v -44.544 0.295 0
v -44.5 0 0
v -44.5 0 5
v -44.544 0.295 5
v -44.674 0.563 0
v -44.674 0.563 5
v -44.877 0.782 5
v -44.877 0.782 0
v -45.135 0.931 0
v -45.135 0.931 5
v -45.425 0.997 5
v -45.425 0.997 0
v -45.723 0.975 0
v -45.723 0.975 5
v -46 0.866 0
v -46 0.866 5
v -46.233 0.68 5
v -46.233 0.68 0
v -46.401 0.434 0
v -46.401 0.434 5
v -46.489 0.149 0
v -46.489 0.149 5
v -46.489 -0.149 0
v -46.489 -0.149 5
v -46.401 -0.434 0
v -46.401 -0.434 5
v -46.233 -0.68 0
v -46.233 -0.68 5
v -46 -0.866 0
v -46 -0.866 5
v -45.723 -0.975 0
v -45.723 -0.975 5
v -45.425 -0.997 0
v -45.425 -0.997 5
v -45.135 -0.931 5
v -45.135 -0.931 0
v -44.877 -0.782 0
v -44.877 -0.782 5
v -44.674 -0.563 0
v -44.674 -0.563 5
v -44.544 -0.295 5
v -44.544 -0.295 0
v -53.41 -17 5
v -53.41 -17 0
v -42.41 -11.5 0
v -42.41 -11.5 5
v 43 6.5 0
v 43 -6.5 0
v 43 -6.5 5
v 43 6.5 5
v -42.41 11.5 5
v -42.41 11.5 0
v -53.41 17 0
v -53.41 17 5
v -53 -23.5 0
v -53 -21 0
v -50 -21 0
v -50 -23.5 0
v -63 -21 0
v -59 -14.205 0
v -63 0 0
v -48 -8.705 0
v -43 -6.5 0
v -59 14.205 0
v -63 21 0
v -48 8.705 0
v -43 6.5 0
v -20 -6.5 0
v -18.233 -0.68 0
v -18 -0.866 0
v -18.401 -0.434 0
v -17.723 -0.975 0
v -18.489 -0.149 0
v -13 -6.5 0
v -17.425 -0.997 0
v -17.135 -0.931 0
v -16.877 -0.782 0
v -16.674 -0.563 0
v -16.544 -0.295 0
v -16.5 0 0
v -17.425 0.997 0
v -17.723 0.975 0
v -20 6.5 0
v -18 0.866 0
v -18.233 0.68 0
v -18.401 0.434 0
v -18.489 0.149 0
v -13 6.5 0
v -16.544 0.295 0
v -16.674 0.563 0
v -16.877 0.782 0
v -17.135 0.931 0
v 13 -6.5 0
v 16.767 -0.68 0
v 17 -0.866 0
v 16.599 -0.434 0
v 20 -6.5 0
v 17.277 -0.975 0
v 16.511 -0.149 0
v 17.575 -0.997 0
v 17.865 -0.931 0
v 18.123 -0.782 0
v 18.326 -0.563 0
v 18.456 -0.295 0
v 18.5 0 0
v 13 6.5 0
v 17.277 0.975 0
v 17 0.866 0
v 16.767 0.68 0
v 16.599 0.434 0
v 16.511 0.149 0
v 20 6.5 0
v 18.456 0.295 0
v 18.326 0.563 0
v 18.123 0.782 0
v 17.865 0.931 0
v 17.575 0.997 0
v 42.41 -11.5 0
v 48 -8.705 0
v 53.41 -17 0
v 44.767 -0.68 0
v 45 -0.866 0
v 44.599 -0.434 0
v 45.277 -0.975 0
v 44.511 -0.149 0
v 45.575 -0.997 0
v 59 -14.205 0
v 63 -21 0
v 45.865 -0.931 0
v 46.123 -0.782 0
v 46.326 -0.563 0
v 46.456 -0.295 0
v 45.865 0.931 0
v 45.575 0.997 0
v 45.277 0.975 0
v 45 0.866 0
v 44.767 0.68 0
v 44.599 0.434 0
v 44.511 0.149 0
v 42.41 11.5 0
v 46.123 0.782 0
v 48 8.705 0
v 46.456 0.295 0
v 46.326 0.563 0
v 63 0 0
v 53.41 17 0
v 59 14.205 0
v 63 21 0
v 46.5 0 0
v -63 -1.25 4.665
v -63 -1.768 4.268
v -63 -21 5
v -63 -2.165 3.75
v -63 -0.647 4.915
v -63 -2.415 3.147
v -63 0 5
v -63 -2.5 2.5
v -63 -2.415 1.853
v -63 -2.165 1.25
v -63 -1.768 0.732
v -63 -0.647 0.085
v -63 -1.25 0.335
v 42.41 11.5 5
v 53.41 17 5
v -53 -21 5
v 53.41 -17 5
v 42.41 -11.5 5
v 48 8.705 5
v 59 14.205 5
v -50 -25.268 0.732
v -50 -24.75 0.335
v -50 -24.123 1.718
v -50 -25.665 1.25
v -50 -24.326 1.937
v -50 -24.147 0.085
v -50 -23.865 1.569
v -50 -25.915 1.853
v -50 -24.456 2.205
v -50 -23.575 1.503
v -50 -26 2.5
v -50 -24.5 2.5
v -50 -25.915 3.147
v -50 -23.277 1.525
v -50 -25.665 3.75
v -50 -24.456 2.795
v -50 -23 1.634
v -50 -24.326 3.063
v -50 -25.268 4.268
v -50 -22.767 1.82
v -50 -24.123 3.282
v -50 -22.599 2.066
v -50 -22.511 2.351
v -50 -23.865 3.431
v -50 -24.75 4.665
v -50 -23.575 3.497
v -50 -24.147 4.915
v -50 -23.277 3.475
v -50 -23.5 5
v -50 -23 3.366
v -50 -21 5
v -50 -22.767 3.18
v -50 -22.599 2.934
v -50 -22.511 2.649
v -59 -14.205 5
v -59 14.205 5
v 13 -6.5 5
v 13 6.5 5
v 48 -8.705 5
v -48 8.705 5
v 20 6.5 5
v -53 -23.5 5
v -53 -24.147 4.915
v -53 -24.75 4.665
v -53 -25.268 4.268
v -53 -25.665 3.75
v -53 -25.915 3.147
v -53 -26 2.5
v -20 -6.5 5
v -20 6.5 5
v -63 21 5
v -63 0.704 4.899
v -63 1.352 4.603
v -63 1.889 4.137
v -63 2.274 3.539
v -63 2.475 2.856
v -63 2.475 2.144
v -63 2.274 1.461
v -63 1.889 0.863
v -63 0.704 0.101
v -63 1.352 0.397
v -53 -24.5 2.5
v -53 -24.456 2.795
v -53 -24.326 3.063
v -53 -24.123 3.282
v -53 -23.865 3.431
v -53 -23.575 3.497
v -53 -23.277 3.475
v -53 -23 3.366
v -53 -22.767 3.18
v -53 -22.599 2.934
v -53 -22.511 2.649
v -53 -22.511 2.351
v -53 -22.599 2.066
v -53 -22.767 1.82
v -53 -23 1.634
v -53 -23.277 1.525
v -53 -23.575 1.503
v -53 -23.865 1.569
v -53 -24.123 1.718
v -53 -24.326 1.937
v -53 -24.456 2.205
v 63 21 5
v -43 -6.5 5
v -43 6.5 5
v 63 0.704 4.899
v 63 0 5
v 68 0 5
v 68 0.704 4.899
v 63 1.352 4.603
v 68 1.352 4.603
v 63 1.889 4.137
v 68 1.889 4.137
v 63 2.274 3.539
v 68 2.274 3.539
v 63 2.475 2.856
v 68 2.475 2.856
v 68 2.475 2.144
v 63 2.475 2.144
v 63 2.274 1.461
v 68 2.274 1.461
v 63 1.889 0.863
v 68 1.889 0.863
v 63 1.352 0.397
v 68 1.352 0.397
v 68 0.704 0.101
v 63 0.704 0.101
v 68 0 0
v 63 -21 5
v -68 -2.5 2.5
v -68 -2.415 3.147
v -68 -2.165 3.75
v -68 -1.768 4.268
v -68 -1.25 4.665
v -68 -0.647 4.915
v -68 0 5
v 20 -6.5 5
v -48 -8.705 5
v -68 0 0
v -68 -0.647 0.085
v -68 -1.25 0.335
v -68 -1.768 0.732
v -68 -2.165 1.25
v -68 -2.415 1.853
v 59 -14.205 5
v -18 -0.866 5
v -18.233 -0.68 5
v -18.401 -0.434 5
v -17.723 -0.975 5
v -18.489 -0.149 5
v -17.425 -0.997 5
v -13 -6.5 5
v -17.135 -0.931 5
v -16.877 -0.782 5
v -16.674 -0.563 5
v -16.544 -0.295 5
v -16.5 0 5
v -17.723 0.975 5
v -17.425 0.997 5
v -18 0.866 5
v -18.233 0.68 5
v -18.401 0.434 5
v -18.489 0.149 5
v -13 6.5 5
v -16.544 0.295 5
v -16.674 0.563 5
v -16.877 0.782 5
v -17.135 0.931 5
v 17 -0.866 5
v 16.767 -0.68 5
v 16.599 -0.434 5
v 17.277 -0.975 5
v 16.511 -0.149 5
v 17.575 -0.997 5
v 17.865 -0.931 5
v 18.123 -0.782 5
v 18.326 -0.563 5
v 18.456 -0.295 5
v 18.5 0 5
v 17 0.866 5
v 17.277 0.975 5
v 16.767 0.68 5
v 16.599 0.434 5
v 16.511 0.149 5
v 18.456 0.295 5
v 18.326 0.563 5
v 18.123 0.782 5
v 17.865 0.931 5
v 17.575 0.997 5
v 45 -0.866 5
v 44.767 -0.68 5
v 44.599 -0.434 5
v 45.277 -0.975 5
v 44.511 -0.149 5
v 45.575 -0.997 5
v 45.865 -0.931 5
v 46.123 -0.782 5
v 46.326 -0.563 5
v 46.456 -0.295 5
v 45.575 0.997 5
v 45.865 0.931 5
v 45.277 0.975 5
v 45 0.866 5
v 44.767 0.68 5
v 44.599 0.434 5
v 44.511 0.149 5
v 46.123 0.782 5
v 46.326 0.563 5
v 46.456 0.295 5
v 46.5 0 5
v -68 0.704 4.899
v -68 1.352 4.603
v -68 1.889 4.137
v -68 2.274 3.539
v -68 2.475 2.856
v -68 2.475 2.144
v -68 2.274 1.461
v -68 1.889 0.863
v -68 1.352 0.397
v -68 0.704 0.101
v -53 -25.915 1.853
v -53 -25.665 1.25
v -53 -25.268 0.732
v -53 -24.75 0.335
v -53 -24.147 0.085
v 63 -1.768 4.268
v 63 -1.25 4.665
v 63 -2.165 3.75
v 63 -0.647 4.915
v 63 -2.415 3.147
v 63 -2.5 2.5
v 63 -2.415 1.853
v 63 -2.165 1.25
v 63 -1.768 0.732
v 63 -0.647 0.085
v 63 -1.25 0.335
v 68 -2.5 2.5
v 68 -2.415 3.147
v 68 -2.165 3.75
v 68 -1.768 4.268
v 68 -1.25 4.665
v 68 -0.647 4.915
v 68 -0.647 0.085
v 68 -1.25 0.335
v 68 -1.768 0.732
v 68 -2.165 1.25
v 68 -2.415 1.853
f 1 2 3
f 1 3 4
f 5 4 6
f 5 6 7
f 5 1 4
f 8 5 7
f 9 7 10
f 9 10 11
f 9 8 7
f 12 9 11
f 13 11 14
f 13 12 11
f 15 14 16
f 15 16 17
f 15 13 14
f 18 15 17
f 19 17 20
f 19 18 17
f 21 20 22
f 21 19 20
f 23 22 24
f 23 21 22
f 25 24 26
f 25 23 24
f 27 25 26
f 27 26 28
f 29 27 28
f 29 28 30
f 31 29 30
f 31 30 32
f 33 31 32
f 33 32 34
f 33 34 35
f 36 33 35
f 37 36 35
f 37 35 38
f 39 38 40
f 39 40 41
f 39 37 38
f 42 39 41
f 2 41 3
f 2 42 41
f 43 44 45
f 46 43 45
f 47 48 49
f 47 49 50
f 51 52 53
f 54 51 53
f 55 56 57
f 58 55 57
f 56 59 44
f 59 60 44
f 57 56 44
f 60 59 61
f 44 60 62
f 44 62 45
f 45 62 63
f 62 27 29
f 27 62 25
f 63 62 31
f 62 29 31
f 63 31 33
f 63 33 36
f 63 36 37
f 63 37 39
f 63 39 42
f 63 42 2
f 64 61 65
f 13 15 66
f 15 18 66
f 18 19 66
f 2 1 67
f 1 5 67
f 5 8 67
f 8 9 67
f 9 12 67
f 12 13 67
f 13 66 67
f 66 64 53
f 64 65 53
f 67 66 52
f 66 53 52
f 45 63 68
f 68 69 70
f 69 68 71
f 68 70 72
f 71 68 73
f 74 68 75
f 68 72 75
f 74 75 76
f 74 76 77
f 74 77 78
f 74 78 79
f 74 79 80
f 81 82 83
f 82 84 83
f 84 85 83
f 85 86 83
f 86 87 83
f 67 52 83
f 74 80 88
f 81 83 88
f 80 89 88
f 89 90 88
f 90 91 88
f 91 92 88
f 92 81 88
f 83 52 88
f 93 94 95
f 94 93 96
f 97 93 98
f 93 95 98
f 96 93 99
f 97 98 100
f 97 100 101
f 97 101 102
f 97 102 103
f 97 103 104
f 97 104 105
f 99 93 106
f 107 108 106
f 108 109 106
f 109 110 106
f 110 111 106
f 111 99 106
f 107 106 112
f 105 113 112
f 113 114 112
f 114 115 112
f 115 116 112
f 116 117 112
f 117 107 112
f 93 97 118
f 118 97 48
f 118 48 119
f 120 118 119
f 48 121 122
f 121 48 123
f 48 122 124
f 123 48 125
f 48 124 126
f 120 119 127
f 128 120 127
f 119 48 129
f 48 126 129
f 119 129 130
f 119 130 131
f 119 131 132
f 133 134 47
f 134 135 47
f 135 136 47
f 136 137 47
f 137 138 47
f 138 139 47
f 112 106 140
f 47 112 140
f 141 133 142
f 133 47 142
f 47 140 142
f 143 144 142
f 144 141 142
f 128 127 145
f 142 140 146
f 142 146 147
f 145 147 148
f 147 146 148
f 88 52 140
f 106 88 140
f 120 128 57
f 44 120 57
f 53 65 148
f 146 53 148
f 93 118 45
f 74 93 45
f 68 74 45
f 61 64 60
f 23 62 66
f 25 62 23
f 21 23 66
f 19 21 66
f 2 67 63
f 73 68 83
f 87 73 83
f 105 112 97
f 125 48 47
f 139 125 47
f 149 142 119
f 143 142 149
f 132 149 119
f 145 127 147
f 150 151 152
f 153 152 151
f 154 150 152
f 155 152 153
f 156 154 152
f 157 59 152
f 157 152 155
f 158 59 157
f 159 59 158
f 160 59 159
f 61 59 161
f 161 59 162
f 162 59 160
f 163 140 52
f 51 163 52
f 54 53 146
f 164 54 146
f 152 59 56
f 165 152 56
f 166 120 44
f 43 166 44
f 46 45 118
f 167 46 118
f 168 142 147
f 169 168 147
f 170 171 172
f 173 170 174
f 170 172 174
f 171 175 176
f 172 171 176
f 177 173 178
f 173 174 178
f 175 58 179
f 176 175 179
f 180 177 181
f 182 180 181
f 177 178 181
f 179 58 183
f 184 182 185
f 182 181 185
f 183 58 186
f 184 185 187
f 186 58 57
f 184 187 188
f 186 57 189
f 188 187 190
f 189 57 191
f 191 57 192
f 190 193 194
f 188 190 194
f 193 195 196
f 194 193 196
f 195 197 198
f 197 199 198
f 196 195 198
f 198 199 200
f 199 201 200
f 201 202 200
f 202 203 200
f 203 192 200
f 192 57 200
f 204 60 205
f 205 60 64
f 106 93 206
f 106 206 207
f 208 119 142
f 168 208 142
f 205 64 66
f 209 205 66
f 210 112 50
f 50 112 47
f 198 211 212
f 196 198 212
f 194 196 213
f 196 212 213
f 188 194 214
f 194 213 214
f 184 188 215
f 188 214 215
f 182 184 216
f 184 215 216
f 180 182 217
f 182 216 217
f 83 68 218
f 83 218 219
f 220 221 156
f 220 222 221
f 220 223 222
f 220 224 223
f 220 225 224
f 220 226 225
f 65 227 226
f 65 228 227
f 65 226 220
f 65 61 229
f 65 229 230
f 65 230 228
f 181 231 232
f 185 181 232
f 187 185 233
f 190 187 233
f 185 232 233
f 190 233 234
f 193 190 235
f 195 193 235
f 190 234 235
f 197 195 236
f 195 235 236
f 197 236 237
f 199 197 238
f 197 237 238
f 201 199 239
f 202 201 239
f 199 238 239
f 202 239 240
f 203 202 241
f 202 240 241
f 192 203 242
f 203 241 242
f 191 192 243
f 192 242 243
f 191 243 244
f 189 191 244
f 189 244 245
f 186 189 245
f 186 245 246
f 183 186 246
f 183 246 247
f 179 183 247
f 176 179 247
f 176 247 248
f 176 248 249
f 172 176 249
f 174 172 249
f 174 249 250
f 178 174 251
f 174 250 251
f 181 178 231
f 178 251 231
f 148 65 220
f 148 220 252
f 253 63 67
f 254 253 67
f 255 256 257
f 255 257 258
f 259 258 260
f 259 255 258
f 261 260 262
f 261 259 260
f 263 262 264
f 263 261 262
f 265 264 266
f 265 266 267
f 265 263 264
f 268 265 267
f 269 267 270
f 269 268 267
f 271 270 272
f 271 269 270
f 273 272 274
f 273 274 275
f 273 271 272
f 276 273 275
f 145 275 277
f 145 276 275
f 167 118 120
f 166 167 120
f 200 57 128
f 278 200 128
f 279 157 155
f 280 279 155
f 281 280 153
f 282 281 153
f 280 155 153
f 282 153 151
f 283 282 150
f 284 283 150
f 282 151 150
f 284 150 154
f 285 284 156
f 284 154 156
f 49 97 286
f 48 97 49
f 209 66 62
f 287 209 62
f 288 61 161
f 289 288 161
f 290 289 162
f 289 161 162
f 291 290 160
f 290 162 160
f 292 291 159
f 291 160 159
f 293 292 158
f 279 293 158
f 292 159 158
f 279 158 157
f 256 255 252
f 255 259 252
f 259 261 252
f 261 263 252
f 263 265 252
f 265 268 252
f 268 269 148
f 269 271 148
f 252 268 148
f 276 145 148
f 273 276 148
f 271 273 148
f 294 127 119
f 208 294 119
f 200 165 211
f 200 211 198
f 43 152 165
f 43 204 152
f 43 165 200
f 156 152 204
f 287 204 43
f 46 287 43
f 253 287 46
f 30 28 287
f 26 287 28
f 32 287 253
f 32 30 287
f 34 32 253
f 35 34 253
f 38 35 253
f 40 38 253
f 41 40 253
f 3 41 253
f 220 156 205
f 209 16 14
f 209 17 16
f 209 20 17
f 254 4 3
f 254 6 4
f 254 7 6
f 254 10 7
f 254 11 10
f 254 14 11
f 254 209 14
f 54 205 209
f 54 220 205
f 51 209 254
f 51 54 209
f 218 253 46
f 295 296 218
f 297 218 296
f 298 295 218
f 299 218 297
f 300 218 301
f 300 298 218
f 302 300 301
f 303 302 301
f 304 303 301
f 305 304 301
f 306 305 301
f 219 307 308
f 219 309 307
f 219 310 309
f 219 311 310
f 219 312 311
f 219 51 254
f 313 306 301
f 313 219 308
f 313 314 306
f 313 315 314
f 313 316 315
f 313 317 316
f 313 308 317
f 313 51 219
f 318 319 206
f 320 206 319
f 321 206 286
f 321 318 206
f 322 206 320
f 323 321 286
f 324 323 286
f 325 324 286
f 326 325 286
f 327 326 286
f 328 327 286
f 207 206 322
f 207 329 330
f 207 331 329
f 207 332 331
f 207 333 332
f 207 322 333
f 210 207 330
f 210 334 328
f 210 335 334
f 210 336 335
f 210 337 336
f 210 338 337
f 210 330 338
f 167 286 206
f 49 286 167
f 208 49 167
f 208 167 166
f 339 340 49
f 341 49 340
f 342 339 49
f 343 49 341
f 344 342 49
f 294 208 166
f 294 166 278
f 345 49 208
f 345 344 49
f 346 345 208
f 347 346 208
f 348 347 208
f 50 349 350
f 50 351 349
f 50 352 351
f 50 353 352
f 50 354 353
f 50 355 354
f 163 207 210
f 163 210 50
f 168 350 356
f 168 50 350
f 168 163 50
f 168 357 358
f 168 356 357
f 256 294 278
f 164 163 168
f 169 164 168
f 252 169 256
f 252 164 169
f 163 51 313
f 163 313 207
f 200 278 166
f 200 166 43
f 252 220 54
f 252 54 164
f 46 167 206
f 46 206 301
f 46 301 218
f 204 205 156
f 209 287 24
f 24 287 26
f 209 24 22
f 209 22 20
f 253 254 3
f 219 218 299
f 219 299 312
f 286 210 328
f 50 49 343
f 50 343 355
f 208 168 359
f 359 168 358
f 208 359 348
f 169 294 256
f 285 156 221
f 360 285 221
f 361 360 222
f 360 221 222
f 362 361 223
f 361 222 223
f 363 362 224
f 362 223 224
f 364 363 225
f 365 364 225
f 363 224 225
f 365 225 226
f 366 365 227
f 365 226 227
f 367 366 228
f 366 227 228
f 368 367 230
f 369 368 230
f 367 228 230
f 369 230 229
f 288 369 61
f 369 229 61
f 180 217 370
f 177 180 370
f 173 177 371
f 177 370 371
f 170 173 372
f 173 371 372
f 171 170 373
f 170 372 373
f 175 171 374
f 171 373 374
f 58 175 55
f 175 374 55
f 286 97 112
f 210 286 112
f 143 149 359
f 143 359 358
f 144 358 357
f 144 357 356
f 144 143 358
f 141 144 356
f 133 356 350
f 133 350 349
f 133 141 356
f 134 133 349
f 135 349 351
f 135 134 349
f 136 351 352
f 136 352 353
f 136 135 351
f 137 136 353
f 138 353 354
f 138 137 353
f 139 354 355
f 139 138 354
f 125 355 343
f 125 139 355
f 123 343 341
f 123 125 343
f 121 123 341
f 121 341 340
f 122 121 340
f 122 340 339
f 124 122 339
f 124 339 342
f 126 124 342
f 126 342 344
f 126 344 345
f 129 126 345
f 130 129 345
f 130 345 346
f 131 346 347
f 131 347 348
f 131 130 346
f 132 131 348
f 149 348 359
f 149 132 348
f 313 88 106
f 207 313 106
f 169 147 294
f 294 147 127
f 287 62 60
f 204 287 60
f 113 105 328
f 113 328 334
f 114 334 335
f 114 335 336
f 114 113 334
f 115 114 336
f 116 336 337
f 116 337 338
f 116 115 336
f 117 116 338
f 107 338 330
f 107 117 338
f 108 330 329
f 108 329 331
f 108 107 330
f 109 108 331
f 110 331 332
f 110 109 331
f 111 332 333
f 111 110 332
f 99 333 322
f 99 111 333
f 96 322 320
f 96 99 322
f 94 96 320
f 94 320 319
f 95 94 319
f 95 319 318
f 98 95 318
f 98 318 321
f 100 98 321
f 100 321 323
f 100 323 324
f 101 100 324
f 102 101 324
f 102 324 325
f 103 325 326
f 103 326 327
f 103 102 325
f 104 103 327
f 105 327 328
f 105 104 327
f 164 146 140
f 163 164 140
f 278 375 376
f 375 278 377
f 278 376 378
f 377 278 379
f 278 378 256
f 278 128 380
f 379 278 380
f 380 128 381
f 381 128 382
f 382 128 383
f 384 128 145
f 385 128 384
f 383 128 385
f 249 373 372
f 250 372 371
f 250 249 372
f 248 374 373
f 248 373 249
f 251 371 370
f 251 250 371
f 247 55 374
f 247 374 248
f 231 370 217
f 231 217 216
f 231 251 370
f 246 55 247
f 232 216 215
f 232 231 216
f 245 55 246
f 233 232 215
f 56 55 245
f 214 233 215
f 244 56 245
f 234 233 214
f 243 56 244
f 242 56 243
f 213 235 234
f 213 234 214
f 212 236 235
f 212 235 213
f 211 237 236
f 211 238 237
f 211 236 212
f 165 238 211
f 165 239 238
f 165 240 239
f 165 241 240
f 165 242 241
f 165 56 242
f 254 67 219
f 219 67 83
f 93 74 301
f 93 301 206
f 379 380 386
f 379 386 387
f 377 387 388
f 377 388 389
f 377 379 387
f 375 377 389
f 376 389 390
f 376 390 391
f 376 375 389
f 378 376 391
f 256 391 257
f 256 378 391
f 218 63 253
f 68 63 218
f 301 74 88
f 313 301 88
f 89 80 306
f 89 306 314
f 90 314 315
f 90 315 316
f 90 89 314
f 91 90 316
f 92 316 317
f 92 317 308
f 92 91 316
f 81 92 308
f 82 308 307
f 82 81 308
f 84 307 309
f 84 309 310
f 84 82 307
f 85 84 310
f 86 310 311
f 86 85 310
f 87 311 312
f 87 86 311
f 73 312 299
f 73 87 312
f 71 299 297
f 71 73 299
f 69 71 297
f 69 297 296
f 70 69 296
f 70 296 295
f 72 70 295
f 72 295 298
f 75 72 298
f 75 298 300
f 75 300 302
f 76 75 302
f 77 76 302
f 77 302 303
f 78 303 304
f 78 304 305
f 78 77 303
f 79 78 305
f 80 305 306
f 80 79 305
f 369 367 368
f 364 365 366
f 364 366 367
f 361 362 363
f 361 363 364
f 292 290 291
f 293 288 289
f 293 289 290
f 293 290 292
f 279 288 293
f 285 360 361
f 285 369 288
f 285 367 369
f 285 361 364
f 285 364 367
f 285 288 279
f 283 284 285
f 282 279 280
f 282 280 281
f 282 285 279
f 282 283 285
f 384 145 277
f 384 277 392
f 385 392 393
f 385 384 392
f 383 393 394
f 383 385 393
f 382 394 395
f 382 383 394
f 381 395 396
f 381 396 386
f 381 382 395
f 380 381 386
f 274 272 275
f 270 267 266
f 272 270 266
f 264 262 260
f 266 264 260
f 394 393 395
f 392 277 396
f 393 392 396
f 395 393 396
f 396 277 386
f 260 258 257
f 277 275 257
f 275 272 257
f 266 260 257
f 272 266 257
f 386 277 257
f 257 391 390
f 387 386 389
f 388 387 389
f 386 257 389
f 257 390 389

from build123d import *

# Parameters (mm, degrees)
F0_W     = 126
F0_H     = 42
F0_R     = 1
F0_W_2   = 23
F0_H_2   = 13
F0_W_3   = 26
F1_DEPTH = 5
F3_DEPTH = 5
F4_W     = 3
F4_H     = 5
F5_DEPTH = 5
F6_R     = 1
F7_DEPTH = 3


# Not quite as in the source:
# - a pattern or mirror of a feature is missing from the dataset's text; its kind, count and spacing are read off the source's solid


with BuildPart() as f1:
    # F0 (on Top) → F1 (new body)
    with BuildSketch(Plane.XY):
        Rectangle(F0_W, F0_H)
        Polygon((-7, -11.5), (7, -11.5), (42.4098300563, -11.5), (53.4098300563, -17), (-53.4098300563, -17), (-42.4098300563, -11.5), align=None, mode=Mode.SUBTRACT)
        Polygon((-59, 14.2049150281), (-48, 8.7049150281), (-48, -8.7049150281), (-59, -14.2049150281), align=None, mode=Mode.SUBTRACT)
        with Locations((-45.5, 0)):
            Circle(F0_R, mode=Mode.SUBTRACT)
        with Locations((-31.5, 0)):
            Rectangle(F0_W_2, F0_H_2, mode=Mode.SUBTRACT)
        with Locations((-17.5, 0)):
            Circle(F0_R, mode=Mode.SUBTRACT)
        Rectangle(F0_W_3, F0_H_2, mode=Mode.SUBTRACT)
        with Locations((17.5, 0)):
            Circle(F0_R, mode=Mode.SUBTRACT)
        with Locations((31.5, 0)):
            Rectangle(F0_W_2, F0_H_2, mode=Mode.SUBTRACT)
        with Locations((45.5, 0)):
            Circle(F0_R, mode=Mode.SUBTRACT)
        Polygon((48, -8.7049150281), (48, 8.7049150281), (59, 14.2049150281), (59, -14.2049150281), align=None, mode=Mode.SUBTRACT)
        Polygon((42.4098300563, 11.5), (7, 11.5), (-7, 11.5), (-42.4098300563, 11.5), (-53.4098300563, 17), (53.4098300563, 17), align=None, mode=Mode.SUBTRACT)
    extrude(amount=F1_DEPTH)

    # F2 (on face) → F3 (join)
    with BuildSketch(Plane(origin=(-63, 0, 0), x_dir=(0, -1, 0), z_dir=(-1, 0, 0))):
        with BuildLine():
            ThreePointArc((0, 0), (1.767766953, 0.732233047), (2.5, 2.5))
            ThreePointArc((2.5, 2.5), (1.7677669583, 4.2677669477), (1.5e-08, 5))
            ThreePointArc((1.5e-08, 5), (-2.5, 2.5000000075), (0, 0))
        make_face()
    f3 = extrude(amount=F3_DEPTH)

    # F3_copies: F3 across plane
    add(f3.mirror(Plane(origin=(0, 0, 0), x_dir=(0, 0, 1), z_dir=(1, 0, 0))))

    # F4 (on face) → F5 (join)
    with BuildSketch(Plane.XZ.offset(21)):
        with Locations((-51.5, 2.5)):
            Rectangle(F4_W, F4_H)
    extrude(amount=F5_DEPTH)

    # F6 (on face) → F7 (cut, through all)
    with BuildSketch(Plane(origin=(-53, 0, 0), x_dir=(0, -1, 0), z_dir=(-1, 0, 0))):
        with Locations((23.5, 2.5)):
            Circle(F6_R)
        with BuildLine():
            Line((26, 2.5), (26, 5))
            Line((26, 5), (23.5, 5))
            ThreePointArc((23.5, 5), (25.267766953, 4.267766953), (26, 2.5))
        make_face()
        with BuildLine():
            Line((26, 0), (26, 2.5))
            ThreePointArc((26, 2.5), (25.267766953, 0.732233047), (23.5, 0))
            Line((23.5, 0), (26, 0))
        make_face()
    extrude(amount=-F7_DEPTH, mode=Mode.SUBTRACT)


solid = f1.part
